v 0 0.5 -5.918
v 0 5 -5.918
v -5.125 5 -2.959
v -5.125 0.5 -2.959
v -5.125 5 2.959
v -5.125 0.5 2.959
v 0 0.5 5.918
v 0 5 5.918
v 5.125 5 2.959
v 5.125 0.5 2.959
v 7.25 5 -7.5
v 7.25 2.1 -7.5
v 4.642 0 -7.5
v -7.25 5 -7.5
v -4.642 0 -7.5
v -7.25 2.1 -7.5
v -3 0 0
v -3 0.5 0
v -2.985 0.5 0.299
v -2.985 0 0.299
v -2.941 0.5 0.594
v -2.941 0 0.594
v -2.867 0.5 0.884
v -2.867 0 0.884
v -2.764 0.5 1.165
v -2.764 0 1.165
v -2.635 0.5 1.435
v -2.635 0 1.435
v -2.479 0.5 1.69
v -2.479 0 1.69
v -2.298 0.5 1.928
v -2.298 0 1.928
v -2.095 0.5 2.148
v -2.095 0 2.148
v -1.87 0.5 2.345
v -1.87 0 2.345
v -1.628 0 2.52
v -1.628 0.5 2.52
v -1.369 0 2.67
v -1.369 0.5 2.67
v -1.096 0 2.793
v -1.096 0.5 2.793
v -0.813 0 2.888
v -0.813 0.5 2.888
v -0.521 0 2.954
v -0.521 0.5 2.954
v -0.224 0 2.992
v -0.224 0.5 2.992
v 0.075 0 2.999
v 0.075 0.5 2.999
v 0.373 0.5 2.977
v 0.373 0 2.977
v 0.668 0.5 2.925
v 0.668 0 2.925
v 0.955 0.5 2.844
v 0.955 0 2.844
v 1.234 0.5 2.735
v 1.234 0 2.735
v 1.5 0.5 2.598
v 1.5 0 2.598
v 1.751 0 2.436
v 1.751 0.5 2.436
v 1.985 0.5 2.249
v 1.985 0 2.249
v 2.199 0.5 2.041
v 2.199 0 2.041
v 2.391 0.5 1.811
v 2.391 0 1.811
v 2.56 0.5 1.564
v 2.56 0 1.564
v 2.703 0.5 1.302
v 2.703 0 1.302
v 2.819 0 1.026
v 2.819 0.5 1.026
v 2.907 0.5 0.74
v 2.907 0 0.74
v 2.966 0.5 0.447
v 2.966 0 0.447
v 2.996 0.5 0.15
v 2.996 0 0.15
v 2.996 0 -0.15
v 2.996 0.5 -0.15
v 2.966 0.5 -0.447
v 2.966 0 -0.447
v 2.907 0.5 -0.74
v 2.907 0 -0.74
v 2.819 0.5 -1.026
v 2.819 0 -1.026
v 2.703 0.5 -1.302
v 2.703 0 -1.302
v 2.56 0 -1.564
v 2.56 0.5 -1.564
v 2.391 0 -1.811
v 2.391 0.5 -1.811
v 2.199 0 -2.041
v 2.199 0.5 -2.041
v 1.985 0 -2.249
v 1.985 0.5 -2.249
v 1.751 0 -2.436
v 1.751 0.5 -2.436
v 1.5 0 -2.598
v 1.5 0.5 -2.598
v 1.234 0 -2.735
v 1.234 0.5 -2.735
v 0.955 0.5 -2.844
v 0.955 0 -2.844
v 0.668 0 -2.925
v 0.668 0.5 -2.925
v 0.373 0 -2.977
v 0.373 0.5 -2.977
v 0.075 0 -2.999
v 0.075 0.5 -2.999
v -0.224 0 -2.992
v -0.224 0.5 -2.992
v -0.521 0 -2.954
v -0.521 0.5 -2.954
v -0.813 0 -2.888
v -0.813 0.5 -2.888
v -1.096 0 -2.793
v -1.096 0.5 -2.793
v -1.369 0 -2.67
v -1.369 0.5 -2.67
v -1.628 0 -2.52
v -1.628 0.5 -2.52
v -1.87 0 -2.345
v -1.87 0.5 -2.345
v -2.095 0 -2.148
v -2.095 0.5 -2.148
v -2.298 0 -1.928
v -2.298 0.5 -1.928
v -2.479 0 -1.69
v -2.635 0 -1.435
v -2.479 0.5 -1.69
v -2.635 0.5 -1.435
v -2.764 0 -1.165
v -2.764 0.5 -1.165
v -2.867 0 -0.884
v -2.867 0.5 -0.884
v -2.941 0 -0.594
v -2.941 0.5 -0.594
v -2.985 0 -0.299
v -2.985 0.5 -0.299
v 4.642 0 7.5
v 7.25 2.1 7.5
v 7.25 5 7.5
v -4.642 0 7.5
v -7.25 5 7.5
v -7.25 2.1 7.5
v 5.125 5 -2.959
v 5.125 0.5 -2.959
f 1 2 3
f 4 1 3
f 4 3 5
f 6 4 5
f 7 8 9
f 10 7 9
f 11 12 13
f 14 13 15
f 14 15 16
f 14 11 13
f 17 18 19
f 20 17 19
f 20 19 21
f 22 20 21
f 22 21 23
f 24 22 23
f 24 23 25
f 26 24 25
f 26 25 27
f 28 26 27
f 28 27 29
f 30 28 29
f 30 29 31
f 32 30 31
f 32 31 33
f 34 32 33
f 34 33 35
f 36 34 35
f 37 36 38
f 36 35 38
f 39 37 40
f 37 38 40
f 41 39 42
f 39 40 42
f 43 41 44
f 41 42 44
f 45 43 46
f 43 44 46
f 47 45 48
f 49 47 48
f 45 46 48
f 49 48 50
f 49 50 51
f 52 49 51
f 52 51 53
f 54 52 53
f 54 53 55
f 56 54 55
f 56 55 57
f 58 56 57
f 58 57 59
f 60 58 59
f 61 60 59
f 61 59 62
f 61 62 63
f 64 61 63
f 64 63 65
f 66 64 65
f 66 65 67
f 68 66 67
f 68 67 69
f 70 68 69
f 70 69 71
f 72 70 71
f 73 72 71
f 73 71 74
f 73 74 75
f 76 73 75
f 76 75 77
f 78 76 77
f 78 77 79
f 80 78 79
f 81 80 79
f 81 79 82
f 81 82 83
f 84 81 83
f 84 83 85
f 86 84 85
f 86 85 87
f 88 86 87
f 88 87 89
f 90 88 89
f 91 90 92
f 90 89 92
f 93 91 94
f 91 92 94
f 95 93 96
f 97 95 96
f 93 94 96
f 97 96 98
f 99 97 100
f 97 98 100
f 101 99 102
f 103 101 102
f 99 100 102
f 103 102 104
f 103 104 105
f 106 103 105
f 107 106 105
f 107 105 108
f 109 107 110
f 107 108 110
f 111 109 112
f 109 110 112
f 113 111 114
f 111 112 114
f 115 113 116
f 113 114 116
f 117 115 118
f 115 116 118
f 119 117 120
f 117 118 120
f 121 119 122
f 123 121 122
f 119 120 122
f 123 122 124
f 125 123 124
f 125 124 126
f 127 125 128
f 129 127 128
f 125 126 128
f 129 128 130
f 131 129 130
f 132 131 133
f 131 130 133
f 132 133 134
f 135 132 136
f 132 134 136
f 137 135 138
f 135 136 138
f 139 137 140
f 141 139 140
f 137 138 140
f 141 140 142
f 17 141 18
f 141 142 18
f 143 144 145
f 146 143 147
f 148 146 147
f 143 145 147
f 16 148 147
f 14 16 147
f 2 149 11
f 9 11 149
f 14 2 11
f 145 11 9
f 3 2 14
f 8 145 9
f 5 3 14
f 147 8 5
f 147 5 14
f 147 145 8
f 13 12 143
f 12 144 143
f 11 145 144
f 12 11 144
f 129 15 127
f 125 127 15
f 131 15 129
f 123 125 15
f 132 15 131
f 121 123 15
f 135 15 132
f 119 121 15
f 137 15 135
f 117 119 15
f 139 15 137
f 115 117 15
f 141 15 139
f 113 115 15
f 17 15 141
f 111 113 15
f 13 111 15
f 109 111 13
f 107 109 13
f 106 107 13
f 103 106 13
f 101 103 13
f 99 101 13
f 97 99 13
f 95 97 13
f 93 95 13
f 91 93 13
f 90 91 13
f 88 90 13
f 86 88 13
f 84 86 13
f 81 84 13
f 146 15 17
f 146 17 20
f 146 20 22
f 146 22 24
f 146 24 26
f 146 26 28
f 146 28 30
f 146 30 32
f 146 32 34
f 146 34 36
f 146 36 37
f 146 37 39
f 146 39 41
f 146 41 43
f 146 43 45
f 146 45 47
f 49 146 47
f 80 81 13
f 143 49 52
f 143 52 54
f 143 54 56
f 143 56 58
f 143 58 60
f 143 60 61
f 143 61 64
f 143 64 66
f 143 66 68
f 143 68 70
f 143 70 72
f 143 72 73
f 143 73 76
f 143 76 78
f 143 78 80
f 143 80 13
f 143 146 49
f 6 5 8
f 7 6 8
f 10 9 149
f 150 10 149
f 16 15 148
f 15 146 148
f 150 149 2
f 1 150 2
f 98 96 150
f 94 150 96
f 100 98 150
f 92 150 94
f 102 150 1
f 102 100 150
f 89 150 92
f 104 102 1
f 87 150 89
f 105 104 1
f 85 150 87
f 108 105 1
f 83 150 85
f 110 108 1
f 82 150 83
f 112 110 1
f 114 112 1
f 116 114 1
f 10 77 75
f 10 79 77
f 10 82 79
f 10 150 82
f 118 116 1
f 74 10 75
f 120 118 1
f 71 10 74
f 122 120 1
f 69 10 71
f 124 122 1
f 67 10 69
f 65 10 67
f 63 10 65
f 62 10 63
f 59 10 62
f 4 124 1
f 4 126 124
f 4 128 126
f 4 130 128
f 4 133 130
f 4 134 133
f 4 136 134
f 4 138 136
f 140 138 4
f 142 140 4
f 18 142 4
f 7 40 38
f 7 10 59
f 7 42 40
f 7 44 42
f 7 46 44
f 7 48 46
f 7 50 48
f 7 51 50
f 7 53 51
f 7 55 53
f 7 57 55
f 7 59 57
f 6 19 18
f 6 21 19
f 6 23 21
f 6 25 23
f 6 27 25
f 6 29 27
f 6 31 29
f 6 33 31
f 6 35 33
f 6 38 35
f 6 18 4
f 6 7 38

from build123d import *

# Parameters (mm, degrees)
PAD_DEPTH       = 7.5
POCKET_DEPTH    = 4.5
SKETCH002_R     = 3
POCKET001_DEPTH = 5.001


with BuildPart() as part:
    # Sketch → Pad (new body, symmetric)
    with BuildSketch(Plane.XY):
        Polygon((7.25, 5), (7.25, 2.1), (4.641857, 0), (0, 0), (-4.641857, 0), (-7.25, 2.1), (-7.25, 5), (0, 5), align=None)
    extrude(amount=PAD_DEPTH, both=True)

    # Sketch001 (on Face1 of Pad) → Pocket (cut)
    with BuildSketch(Plane(origin=(0, 5, 0), x_dir=(-1, 0, 0), z_dir=(0, 1, 0))):
        Polygon((0, 5.91784), (-5.125, 2.95892), (-5.125, -2.95892), (0, -5.91784), (5.125, -2.95892), (5.125, 2.95892), align=None)
    extrude(amount=-POCKET_DEPTH, mode=Mode.SUBTRACT)

    # Sketch002 (on Face1 of Pocket) → Pocket001 (cut, through all)
    with BuildSketch(Plane(origin=(0, 5, 0), x_dir=(-1, 0, 0), z_dir=(0, 1, 0))):
        Circle(SKETCH002_R)
    extrude(amount=-POCKET001_DEPTH, mode=Mode.SUBTRACT)


solid = part.part
